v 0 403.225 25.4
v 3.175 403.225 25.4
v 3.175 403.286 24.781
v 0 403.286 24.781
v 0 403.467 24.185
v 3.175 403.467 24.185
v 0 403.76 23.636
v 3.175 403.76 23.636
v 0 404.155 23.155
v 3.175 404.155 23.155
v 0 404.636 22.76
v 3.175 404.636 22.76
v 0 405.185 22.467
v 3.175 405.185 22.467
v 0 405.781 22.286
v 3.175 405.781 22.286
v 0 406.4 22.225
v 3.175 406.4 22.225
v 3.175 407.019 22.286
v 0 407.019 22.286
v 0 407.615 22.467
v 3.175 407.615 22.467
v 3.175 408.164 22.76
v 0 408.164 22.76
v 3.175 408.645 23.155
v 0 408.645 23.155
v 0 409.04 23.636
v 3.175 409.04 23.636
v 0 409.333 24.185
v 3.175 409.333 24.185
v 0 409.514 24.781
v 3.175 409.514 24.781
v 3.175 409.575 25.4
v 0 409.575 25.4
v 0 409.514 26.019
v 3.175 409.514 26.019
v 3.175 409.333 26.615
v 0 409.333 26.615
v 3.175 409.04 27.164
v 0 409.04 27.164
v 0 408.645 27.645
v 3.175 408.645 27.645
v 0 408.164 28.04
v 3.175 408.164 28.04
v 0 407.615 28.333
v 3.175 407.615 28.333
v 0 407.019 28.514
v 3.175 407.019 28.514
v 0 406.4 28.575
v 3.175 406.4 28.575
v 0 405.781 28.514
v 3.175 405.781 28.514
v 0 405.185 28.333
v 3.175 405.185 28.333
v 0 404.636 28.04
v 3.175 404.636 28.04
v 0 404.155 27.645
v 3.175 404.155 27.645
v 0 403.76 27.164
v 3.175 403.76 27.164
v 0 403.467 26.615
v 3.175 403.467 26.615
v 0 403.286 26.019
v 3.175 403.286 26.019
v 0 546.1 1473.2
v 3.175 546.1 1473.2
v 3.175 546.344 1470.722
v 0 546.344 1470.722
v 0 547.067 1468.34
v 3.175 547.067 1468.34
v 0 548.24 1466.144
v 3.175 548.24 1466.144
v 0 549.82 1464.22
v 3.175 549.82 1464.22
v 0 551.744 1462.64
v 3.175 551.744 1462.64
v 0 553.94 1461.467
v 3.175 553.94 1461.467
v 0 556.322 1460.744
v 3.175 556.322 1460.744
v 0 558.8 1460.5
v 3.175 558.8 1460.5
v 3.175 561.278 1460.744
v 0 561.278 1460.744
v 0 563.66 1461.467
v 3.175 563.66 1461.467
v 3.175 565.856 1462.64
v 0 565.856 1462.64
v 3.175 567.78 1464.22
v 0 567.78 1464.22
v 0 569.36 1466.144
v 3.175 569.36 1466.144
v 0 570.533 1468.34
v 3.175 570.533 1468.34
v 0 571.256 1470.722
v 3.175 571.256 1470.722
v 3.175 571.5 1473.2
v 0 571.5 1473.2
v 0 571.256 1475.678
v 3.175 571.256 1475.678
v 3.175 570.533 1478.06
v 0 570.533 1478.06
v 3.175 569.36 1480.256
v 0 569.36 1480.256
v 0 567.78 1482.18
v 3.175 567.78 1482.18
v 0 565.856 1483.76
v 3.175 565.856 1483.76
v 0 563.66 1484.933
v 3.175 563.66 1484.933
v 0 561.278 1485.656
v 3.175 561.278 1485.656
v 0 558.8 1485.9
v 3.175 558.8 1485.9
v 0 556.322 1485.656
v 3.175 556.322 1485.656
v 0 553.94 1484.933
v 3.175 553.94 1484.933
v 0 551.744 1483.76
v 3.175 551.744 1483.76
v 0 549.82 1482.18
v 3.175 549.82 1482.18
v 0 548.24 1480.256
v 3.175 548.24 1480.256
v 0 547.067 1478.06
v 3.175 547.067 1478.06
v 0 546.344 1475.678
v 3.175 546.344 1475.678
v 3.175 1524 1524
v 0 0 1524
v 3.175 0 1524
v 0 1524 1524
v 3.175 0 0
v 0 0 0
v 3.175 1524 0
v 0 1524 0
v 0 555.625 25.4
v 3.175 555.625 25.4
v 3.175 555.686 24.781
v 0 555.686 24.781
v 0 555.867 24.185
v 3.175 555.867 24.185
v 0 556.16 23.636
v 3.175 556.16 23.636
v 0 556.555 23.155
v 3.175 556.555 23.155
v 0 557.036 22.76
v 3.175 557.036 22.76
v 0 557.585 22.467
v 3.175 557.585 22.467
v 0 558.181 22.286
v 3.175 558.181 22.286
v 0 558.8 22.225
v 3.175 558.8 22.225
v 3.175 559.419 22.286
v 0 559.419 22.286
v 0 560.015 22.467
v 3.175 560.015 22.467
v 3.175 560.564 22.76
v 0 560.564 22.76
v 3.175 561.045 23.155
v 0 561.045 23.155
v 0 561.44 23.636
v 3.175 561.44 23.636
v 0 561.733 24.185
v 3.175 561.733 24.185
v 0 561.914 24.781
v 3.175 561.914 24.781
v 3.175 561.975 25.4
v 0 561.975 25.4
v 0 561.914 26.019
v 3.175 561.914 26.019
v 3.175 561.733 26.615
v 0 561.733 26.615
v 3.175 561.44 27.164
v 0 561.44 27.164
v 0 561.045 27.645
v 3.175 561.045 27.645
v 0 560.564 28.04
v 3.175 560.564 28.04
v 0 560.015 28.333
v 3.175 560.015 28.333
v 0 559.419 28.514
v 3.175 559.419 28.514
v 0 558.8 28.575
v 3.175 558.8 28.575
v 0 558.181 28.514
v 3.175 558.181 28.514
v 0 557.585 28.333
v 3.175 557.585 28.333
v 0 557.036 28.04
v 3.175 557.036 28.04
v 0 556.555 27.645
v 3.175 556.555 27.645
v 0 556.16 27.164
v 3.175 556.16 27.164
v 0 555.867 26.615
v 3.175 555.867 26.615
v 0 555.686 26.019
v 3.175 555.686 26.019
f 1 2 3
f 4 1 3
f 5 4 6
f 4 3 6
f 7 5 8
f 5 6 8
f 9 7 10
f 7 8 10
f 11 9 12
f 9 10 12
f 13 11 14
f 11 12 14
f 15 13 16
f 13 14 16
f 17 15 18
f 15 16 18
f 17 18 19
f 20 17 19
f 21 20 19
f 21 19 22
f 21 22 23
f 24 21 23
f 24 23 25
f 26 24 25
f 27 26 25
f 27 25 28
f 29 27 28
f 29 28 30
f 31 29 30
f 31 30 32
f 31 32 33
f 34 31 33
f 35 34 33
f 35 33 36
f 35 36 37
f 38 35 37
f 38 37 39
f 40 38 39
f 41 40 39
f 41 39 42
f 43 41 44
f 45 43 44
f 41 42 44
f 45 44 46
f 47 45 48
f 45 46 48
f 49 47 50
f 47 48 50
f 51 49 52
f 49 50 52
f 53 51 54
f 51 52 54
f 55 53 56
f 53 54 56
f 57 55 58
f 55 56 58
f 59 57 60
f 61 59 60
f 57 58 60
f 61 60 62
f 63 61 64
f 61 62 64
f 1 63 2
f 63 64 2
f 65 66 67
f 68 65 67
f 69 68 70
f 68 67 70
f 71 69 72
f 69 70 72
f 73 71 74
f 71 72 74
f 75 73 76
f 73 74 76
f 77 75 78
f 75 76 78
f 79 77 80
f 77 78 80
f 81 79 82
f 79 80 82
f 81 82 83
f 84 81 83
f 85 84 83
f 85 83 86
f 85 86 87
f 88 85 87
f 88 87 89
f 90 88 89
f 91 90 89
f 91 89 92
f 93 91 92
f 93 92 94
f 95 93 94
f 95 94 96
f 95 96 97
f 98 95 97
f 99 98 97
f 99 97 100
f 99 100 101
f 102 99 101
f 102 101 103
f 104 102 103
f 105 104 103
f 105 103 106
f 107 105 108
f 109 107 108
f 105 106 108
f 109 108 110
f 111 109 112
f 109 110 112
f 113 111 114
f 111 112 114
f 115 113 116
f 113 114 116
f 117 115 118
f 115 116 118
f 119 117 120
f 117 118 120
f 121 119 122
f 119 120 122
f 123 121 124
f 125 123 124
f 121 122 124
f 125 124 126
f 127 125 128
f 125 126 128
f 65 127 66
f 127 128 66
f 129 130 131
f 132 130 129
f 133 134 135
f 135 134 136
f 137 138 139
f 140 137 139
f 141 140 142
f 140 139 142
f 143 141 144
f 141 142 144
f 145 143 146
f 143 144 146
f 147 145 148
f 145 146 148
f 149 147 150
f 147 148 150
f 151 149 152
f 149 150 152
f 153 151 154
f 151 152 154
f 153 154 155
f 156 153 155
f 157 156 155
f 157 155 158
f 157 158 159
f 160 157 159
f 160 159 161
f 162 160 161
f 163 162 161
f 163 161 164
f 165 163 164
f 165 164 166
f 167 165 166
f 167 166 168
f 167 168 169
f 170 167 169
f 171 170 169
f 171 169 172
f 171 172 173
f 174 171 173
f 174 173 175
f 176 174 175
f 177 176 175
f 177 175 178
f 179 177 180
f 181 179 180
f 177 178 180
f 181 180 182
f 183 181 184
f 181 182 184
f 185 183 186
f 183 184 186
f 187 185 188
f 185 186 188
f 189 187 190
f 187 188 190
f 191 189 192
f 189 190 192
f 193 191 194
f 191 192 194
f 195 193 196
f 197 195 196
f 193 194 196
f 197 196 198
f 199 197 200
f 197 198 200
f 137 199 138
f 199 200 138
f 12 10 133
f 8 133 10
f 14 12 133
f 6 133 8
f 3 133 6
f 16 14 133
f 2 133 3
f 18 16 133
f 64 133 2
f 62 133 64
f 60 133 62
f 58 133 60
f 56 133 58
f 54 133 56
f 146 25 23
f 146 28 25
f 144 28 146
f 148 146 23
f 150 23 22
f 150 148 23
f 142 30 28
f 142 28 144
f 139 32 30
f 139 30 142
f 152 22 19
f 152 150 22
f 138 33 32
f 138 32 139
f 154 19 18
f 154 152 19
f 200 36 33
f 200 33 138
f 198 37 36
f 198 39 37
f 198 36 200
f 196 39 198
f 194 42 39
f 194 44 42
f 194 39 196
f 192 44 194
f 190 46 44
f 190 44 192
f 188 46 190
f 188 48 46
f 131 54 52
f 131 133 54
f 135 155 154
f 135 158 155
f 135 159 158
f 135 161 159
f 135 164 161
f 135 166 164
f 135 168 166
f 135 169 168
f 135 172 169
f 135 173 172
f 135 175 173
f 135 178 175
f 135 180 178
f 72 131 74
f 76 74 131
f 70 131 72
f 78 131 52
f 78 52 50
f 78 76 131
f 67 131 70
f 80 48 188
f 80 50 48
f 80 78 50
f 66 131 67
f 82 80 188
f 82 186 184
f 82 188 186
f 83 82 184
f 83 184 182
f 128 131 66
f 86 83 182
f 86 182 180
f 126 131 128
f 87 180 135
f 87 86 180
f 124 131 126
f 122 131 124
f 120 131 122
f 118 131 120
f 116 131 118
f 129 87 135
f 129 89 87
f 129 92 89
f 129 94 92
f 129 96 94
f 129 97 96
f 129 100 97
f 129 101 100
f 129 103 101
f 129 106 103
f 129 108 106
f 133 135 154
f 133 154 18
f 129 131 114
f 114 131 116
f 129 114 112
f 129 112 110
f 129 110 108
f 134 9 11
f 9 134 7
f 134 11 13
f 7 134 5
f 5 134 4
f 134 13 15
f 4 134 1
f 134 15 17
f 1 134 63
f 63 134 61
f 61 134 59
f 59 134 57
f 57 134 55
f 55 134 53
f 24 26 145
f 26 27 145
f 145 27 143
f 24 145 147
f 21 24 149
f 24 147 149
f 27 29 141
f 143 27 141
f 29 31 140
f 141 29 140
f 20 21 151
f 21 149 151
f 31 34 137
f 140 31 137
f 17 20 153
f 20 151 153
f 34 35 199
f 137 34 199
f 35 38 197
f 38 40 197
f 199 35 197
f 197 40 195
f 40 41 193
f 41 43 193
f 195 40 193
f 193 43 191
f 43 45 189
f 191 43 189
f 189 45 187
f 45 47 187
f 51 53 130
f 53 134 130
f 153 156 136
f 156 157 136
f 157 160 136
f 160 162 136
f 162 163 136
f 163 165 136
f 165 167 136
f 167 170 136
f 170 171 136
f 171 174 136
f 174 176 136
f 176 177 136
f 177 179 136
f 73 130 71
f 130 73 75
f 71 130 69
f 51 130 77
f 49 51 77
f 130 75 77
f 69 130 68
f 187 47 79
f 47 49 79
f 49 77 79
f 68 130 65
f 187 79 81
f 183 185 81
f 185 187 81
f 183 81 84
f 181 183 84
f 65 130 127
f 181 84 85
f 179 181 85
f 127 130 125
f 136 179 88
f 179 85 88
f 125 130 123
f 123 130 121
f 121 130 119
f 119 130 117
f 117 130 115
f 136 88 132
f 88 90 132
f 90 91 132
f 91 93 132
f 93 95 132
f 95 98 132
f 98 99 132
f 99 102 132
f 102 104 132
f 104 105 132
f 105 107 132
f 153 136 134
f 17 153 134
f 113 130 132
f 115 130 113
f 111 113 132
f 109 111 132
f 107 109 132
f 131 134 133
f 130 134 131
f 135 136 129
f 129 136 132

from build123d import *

# Parameters (mm, degrees)
F0_W     = 1524
F0_H     = 1524
F1_DEPTH = 3.175
F2_D     = 6.35
F3_D     = 6.35
F4_D     = 25.4


with BuildPart() as f1:
    # F0 (on Right) → F1 (new body)
    with BuildSketch(Plane.YZ):
        with Locations((762, 762)):
            Rectangle(F0_W, F0_H)
    extrude(amount=F1_DEPTH)

    # F2 (through all)
    with Locations(Plane(origin=(0, 0, 0), x_dir=(0, 1, 0), z_dir=(-1, 0, 0))):
        with Locations((406.4, -25.4)):
            Hole(F2_D / 2)

    # F3 (through all)
    with Locations(Plane(origin=(0, 0, 0), x_dir=(0, 1, 0), z_dir=(-1, 0, 0))):
        with Locations((558.8, -25.4)):
            Hole(F3_D / 2)

    # F4 (through all)
    with Locations(Plane(origin=(0, 0, 0), x_dir=(0, 1, 0), z_dir=(-1, 0, 0))):
        with Locations((558.8, -1473.2)):
            Hole(F4_D / 2)


solid = f1.part
